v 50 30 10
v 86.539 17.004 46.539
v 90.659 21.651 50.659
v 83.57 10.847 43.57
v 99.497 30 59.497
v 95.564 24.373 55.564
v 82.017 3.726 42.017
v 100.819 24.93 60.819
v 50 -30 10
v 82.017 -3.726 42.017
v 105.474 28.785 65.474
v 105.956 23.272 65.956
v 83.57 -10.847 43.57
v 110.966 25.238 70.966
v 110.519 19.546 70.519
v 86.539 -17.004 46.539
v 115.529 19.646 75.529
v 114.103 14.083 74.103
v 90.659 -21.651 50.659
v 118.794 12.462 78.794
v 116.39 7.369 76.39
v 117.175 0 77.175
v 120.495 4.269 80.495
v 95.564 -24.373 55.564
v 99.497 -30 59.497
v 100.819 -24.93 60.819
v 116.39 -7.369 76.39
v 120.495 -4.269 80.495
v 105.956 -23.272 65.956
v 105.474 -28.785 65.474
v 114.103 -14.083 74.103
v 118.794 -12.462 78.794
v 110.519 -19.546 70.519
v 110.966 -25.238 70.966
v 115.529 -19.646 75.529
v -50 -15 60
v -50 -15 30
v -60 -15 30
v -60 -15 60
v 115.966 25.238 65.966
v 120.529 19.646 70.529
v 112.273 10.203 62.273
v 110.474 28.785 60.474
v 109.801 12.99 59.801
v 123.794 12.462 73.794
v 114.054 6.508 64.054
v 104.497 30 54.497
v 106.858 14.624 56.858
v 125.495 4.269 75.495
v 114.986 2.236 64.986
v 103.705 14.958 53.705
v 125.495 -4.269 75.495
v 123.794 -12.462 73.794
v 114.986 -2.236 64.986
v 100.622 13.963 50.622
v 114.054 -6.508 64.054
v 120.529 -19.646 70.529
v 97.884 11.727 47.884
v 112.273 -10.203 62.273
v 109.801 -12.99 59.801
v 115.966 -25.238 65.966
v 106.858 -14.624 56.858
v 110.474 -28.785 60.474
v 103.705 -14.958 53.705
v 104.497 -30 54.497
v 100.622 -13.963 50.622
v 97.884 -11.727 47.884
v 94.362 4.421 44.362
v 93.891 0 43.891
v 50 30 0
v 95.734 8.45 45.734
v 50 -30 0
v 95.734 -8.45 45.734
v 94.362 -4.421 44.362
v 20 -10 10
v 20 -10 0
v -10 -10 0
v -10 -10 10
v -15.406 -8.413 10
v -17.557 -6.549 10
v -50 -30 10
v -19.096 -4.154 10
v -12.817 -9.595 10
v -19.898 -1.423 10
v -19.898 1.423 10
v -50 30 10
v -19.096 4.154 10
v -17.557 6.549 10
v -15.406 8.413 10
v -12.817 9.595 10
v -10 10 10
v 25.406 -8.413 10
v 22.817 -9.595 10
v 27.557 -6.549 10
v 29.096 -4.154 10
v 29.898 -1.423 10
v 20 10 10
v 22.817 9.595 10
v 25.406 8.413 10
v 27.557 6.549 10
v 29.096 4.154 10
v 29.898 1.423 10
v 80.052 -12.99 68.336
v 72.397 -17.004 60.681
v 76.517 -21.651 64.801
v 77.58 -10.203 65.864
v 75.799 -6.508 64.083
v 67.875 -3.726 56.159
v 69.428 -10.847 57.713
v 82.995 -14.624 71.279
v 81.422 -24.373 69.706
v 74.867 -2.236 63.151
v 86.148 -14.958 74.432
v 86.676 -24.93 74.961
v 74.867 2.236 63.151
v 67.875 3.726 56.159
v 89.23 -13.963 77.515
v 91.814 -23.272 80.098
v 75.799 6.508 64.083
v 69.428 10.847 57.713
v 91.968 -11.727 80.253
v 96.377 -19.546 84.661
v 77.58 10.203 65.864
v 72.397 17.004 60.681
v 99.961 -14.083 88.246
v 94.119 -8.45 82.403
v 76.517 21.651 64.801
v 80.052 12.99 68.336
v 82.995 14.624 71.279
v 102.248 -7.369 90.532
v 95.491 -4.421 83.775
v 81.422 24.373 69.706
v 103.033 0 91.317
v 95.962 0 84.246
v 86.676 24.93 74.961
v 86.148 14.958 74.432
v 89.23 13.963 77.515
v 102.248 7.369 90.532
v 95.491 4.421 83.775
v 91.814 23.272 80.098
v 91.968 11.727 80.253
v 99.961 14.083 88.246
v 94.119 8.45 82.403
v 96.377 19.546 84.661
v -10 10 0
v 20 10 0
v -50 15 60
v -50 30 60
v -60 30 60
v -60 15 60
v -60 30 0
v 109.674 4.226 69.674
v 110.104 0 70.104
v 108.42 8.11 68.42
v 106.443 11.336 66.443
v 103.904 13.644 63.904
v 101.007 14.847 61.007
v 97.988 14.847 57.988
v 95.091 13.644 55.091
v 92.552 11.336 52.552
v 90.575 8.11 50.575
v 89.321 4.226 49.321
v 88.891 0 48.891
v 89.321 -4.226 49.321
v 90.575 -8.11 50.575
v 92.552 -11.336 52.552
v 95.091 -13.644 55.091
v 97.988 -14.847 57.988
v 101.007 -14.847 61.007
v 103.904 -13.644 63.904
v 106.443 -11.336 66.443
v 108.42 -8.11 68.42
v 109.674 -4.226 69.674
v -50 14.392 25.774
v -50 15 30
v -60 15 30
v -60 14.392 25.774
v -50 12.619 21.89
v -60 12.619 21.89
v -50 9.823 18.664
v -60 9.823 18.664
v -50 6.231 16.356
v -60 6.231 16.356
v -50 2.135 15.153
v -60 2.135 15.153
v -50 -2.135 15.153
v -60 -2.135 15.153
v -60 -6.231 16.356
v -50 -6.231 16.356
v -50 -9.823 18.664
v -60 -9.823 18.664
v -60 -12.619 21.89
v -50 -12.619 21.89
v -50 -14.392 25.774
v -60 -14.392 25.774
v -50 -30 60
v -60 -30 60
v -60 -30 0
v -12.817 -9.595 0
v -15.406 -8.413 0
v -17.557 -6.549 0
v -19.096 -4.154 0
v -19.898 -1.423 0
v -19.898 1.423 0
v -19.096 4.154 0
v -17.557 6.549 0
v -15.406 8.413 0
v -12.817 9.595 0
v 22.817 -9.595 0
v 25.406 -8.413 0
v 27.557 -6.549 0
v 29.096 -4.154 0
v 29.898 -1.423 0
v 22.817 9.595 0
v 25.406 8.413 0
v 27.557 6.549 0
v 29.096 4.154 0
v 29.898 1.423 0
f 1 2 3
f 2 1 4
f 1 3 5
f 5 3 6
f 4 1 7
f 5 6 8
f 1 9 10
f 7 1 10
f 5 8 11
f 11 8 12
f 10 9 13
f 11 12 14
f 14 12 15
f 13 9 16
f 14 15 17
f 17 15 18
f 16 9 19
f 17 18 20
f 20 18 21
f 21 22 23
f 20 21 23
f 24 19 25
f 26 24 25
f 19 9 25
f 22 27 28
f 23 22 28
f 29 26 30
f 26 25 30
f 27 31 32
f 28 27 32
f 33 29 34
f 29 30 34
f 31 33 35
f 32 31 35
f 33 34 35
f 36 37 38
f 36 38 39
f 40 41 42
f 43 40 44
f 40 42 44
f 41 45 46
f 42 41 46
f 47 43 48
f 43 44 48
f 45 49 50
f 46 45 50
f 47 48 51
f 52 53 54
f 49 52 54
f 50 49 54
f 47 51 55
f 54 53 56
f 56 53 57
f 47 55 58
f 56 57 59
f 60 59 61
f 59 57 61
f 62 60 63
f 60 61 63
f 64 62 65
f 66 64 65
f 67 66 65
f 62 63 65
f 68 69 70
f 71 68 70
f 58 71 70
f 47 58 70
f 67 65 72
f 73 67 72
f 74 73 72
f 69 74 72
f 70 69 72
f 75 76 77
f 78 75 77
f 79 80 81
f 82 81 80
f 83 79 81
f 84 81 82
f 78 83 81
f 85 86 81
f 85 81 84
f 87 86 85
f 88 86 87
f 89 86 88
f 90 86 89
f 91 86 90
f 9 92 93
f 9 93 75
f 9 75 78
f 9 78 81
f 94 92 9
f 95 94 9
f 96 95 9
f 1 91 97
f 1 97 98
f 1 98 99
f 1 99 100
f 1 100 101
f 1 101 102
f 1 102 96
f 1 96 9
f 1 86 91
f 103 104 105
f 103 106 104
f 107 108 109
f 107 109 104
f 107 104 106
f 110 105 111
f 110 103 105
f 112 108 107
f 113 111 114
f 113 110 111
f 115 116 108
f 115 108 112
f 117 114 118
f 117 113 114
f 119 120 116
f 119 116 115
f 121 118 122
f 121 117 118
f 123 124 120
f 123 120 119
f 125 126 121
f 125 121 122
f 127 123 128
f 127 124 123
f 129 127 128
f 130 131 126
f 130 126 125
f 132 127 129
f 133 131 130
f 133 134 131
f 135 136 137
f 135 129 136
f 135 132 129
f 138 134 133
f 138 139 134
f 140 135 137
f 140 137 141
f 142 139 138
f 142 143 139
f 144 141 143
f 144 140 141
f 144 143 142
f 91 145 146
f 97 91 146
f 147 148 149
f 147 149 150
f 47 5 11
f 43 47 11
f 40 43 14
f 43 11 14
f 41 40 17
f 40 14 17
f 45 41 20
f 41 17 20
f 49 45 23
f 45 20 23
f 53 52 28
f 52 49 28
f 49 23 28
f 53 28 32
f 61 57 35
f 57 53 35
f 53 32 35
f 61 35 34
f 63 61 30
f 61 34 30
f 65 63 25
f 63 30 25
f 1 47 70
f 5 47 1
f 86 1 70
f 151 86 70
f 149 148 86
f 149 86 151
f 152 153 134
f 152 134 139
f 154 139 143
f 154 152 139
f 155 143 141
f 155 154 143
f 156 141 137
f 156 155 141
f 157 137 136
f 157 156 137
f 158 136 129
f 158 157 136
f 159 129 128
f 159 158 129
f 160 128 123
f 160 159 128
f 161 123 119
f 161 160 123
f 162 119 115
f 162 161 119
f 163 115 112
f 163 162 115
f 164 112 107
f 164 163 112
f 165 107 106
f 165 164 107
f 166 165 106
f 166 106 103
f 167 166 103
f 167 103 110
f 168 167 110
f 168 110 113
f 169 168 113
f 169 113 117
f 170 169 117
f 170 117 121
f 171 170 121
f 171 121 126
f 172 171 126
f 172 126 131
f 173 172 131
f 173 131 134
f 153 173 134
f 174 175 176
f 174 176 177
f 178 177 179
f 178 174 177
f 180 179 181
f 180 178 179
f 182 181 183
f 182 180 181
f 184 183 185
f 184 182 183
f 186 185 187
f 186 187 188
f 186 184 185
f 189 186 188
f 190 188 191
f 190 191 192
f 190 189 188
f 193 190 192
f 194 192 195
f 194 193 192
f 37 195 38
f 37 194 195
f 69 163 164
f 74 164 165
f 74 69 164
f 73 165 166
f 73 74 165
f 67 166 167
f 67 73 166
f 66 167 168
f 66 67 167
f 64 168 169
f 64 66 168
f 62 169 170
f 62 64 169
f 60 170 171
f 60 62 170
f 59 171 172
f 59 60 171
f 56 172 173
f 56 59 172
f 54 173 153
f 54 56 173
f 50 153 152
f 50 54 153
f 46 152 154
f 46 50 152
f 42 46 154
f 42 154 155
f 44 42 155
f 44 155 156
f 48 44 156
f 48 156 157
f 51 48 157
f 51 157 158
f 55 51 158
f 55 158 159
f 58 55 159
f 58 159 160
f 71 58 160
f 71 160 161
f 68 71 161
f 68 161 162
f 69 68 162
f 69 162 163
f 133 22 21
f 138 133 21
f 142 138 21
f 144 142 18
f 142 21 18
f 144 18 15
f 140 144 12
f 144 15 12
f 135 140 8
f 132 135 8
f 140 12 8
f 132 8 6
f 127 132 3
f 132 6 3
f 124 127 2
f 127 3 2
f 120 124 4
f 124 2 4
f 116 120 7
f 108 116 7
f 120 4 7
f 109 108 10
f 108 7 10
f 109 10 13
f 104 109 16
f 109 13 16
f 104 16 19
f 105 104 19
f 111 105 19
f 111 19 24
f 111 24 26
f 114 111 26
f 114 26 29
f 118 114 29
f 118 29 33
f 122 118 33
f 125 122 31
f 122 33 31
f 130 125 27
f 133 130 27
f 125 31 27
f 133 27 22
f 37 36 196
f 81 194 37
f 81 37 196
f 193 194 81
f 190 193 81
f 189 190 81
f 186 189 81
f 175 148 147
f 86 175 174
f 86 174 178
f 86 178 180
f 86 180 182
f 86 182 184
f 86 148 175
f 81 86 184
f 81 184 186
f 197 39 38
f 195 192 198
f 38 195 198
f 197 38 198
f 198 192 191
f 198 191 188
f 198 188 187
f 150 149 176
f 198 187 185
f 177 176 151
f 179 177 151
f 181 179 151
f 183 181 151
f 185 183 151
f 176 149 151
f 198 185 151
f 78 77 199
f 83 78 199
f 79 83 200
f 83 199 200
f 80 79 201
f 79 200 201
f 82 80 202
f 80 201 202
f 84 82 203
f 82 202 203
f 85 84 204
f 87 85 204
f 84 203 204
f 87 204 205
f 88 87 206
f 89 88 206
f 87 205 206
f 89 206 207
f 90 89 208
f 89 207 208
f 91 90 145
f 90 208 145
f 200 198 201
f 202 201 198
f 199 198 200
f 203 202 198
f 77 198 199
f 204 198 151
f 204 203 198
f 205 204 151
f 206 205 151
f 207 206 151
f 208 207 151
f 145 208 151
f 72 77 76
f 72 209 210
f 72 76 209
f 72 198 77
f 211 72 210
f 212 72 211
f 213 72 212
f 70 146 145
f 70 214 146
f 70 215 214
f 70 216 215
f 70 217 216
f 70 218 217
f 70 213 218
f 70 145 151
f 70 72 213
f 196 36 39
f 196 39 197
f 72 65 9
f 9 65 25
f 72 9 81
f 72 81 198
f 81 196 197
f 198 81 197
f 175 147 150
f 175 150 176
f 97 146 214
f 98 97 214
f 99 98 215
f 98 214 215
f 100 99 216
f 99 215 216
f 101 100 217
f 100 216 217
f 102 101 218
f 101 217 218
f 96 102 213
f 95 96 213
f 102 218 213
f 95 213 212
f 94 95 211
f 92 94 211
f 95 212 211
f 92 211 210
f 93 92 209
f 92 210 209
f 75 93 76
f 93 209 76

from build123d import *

# Parameters (mm, degrees)
SKETCH1_W           = 100
SKETCH1_H           = 60
BOSS_EXTRUDE1_DEPTH = 10
BOSS_EXTRUDE2_DEPTH = 10
BOSS_EXTRUDE3_DEPTH = 60
SKETCH5_R           = 25
SKETCH5_R_2         = 15
BOSS_EXTRUDE4_DEPTH = 20
CUT_EXTRUDE3_DEPTH  = 20
CUT_EXTRUDE4_START  = -20
SKETCH6_R           = 15
CUT_EXTRUDE4_DEPTH  = 20


with BuildPart() as part:
    # Sketch1 → Boss-Extrude1 (new body)
    with BuildSketch(Plane.XY):
        Rectangle(SKETCH1_W, SKETCH1_H)
        with BuildLine():
            Line((-10, 10), (20, 10))
            ThreePointArc((20, 10), (30, 0), (20, -10))
            Line((20, -10), (-10, -10))
            ThreePointArc((-10, -10), (-20, 0), (-10, 10))
        make_face(mode=Mode.SUBTRACT)
    extrude(amount=BOSS_EXTRUDE1_DEPTH)

    # Sketch3 → Boss-Extrude2 (add)
    with BuildSketch(Plane.ZY.offset(50)):
        with BuildLine():
            Line((0, 30), (60, 30))
            Line((60, 30), (60, 15))
            Line((60, 15), (30, 15))
            ThreePointArc((30, 15), (15, 0), (30, -15))
            Line((30, -15), (60, -15))
            Line((60, -15), (60, -30))
            Line((60, -30), (0, -30))
            Line((0, -30), (0, 30))
        make_face()
    extrude(amount=BOSS_EXTRUDE2_DEPTH)

    # Sketch4 → Boss-Extrude3 (add)
    with BuildSketch(Plane.XZ.offset(30)):
        Polygon((50, 10), (125, 85), (130, 80), (50, 0), align=None)
    extrude(amount=-BOSS_EXTRUDE3_DEPTH)

    # Sketch5 → Boss-Extrude4 (add)
    with BuildSketch(Plane(origin=(20, 0, -20), x_dir=(0.7071067811865462, 0, 0.7071067811865488), z_dir=(-0.7071067811865488, 0, 0.7071067811865462))):
        with Locations((112.426406871, 0)):
            Circle(SKETCH5_R)
        with Locations((112.426406871, 0)):
            Circle(SKETCH5_R_2, mode=Mode.SUBTRACT)
    extrude(amount=BOSS_EXTRUDE4_DEPTH)

    # Sketch5<4> → Cut-Extrude3 (cut)
    with BuildSketch(Plane(origin=(20, 0, -20), x_dir=(0.7071067811865462, 0, 0.7071067811865488), z_dir=(-0.7071067811865488, 0, 0.7071067811865462))):
        with BuildLine():
            Line((112.426406871, -30), (148.492424049, -30))
            Line((148.492424049, -30), (148.492424049, 30))
            Line((148.492424049, 30), (112.426406871, 30))
            ThreePointArc((112.426406871, 30), (142.426406871, 0), (112.426406871, -30))
        make_face()
    extrude(amount=-CUT_EXTRUDE3_DEPTH, mode=Mode.SUBTRACT)

    # Sketch6 → Cut-Extrude4 (cut)
    with BuildSketch(Plane(origin=(20, 0, -20), x_dir=(0.7071067811865464, 0, 0.7071067811865488), z_dir=(-0.7071067811865488, 0, 0.7071067811865464)).offset(CUT_EXTRUDE4_START)):
        with Locations(Location((112.426406871, 0, 0), (0, 0, 180))):
            Circle(SKETCH6_R)
    extrude(amount=CUT_EXTRUDE4_DEPTH, mode=Mode.SUBTRACT)


solid = part.part
